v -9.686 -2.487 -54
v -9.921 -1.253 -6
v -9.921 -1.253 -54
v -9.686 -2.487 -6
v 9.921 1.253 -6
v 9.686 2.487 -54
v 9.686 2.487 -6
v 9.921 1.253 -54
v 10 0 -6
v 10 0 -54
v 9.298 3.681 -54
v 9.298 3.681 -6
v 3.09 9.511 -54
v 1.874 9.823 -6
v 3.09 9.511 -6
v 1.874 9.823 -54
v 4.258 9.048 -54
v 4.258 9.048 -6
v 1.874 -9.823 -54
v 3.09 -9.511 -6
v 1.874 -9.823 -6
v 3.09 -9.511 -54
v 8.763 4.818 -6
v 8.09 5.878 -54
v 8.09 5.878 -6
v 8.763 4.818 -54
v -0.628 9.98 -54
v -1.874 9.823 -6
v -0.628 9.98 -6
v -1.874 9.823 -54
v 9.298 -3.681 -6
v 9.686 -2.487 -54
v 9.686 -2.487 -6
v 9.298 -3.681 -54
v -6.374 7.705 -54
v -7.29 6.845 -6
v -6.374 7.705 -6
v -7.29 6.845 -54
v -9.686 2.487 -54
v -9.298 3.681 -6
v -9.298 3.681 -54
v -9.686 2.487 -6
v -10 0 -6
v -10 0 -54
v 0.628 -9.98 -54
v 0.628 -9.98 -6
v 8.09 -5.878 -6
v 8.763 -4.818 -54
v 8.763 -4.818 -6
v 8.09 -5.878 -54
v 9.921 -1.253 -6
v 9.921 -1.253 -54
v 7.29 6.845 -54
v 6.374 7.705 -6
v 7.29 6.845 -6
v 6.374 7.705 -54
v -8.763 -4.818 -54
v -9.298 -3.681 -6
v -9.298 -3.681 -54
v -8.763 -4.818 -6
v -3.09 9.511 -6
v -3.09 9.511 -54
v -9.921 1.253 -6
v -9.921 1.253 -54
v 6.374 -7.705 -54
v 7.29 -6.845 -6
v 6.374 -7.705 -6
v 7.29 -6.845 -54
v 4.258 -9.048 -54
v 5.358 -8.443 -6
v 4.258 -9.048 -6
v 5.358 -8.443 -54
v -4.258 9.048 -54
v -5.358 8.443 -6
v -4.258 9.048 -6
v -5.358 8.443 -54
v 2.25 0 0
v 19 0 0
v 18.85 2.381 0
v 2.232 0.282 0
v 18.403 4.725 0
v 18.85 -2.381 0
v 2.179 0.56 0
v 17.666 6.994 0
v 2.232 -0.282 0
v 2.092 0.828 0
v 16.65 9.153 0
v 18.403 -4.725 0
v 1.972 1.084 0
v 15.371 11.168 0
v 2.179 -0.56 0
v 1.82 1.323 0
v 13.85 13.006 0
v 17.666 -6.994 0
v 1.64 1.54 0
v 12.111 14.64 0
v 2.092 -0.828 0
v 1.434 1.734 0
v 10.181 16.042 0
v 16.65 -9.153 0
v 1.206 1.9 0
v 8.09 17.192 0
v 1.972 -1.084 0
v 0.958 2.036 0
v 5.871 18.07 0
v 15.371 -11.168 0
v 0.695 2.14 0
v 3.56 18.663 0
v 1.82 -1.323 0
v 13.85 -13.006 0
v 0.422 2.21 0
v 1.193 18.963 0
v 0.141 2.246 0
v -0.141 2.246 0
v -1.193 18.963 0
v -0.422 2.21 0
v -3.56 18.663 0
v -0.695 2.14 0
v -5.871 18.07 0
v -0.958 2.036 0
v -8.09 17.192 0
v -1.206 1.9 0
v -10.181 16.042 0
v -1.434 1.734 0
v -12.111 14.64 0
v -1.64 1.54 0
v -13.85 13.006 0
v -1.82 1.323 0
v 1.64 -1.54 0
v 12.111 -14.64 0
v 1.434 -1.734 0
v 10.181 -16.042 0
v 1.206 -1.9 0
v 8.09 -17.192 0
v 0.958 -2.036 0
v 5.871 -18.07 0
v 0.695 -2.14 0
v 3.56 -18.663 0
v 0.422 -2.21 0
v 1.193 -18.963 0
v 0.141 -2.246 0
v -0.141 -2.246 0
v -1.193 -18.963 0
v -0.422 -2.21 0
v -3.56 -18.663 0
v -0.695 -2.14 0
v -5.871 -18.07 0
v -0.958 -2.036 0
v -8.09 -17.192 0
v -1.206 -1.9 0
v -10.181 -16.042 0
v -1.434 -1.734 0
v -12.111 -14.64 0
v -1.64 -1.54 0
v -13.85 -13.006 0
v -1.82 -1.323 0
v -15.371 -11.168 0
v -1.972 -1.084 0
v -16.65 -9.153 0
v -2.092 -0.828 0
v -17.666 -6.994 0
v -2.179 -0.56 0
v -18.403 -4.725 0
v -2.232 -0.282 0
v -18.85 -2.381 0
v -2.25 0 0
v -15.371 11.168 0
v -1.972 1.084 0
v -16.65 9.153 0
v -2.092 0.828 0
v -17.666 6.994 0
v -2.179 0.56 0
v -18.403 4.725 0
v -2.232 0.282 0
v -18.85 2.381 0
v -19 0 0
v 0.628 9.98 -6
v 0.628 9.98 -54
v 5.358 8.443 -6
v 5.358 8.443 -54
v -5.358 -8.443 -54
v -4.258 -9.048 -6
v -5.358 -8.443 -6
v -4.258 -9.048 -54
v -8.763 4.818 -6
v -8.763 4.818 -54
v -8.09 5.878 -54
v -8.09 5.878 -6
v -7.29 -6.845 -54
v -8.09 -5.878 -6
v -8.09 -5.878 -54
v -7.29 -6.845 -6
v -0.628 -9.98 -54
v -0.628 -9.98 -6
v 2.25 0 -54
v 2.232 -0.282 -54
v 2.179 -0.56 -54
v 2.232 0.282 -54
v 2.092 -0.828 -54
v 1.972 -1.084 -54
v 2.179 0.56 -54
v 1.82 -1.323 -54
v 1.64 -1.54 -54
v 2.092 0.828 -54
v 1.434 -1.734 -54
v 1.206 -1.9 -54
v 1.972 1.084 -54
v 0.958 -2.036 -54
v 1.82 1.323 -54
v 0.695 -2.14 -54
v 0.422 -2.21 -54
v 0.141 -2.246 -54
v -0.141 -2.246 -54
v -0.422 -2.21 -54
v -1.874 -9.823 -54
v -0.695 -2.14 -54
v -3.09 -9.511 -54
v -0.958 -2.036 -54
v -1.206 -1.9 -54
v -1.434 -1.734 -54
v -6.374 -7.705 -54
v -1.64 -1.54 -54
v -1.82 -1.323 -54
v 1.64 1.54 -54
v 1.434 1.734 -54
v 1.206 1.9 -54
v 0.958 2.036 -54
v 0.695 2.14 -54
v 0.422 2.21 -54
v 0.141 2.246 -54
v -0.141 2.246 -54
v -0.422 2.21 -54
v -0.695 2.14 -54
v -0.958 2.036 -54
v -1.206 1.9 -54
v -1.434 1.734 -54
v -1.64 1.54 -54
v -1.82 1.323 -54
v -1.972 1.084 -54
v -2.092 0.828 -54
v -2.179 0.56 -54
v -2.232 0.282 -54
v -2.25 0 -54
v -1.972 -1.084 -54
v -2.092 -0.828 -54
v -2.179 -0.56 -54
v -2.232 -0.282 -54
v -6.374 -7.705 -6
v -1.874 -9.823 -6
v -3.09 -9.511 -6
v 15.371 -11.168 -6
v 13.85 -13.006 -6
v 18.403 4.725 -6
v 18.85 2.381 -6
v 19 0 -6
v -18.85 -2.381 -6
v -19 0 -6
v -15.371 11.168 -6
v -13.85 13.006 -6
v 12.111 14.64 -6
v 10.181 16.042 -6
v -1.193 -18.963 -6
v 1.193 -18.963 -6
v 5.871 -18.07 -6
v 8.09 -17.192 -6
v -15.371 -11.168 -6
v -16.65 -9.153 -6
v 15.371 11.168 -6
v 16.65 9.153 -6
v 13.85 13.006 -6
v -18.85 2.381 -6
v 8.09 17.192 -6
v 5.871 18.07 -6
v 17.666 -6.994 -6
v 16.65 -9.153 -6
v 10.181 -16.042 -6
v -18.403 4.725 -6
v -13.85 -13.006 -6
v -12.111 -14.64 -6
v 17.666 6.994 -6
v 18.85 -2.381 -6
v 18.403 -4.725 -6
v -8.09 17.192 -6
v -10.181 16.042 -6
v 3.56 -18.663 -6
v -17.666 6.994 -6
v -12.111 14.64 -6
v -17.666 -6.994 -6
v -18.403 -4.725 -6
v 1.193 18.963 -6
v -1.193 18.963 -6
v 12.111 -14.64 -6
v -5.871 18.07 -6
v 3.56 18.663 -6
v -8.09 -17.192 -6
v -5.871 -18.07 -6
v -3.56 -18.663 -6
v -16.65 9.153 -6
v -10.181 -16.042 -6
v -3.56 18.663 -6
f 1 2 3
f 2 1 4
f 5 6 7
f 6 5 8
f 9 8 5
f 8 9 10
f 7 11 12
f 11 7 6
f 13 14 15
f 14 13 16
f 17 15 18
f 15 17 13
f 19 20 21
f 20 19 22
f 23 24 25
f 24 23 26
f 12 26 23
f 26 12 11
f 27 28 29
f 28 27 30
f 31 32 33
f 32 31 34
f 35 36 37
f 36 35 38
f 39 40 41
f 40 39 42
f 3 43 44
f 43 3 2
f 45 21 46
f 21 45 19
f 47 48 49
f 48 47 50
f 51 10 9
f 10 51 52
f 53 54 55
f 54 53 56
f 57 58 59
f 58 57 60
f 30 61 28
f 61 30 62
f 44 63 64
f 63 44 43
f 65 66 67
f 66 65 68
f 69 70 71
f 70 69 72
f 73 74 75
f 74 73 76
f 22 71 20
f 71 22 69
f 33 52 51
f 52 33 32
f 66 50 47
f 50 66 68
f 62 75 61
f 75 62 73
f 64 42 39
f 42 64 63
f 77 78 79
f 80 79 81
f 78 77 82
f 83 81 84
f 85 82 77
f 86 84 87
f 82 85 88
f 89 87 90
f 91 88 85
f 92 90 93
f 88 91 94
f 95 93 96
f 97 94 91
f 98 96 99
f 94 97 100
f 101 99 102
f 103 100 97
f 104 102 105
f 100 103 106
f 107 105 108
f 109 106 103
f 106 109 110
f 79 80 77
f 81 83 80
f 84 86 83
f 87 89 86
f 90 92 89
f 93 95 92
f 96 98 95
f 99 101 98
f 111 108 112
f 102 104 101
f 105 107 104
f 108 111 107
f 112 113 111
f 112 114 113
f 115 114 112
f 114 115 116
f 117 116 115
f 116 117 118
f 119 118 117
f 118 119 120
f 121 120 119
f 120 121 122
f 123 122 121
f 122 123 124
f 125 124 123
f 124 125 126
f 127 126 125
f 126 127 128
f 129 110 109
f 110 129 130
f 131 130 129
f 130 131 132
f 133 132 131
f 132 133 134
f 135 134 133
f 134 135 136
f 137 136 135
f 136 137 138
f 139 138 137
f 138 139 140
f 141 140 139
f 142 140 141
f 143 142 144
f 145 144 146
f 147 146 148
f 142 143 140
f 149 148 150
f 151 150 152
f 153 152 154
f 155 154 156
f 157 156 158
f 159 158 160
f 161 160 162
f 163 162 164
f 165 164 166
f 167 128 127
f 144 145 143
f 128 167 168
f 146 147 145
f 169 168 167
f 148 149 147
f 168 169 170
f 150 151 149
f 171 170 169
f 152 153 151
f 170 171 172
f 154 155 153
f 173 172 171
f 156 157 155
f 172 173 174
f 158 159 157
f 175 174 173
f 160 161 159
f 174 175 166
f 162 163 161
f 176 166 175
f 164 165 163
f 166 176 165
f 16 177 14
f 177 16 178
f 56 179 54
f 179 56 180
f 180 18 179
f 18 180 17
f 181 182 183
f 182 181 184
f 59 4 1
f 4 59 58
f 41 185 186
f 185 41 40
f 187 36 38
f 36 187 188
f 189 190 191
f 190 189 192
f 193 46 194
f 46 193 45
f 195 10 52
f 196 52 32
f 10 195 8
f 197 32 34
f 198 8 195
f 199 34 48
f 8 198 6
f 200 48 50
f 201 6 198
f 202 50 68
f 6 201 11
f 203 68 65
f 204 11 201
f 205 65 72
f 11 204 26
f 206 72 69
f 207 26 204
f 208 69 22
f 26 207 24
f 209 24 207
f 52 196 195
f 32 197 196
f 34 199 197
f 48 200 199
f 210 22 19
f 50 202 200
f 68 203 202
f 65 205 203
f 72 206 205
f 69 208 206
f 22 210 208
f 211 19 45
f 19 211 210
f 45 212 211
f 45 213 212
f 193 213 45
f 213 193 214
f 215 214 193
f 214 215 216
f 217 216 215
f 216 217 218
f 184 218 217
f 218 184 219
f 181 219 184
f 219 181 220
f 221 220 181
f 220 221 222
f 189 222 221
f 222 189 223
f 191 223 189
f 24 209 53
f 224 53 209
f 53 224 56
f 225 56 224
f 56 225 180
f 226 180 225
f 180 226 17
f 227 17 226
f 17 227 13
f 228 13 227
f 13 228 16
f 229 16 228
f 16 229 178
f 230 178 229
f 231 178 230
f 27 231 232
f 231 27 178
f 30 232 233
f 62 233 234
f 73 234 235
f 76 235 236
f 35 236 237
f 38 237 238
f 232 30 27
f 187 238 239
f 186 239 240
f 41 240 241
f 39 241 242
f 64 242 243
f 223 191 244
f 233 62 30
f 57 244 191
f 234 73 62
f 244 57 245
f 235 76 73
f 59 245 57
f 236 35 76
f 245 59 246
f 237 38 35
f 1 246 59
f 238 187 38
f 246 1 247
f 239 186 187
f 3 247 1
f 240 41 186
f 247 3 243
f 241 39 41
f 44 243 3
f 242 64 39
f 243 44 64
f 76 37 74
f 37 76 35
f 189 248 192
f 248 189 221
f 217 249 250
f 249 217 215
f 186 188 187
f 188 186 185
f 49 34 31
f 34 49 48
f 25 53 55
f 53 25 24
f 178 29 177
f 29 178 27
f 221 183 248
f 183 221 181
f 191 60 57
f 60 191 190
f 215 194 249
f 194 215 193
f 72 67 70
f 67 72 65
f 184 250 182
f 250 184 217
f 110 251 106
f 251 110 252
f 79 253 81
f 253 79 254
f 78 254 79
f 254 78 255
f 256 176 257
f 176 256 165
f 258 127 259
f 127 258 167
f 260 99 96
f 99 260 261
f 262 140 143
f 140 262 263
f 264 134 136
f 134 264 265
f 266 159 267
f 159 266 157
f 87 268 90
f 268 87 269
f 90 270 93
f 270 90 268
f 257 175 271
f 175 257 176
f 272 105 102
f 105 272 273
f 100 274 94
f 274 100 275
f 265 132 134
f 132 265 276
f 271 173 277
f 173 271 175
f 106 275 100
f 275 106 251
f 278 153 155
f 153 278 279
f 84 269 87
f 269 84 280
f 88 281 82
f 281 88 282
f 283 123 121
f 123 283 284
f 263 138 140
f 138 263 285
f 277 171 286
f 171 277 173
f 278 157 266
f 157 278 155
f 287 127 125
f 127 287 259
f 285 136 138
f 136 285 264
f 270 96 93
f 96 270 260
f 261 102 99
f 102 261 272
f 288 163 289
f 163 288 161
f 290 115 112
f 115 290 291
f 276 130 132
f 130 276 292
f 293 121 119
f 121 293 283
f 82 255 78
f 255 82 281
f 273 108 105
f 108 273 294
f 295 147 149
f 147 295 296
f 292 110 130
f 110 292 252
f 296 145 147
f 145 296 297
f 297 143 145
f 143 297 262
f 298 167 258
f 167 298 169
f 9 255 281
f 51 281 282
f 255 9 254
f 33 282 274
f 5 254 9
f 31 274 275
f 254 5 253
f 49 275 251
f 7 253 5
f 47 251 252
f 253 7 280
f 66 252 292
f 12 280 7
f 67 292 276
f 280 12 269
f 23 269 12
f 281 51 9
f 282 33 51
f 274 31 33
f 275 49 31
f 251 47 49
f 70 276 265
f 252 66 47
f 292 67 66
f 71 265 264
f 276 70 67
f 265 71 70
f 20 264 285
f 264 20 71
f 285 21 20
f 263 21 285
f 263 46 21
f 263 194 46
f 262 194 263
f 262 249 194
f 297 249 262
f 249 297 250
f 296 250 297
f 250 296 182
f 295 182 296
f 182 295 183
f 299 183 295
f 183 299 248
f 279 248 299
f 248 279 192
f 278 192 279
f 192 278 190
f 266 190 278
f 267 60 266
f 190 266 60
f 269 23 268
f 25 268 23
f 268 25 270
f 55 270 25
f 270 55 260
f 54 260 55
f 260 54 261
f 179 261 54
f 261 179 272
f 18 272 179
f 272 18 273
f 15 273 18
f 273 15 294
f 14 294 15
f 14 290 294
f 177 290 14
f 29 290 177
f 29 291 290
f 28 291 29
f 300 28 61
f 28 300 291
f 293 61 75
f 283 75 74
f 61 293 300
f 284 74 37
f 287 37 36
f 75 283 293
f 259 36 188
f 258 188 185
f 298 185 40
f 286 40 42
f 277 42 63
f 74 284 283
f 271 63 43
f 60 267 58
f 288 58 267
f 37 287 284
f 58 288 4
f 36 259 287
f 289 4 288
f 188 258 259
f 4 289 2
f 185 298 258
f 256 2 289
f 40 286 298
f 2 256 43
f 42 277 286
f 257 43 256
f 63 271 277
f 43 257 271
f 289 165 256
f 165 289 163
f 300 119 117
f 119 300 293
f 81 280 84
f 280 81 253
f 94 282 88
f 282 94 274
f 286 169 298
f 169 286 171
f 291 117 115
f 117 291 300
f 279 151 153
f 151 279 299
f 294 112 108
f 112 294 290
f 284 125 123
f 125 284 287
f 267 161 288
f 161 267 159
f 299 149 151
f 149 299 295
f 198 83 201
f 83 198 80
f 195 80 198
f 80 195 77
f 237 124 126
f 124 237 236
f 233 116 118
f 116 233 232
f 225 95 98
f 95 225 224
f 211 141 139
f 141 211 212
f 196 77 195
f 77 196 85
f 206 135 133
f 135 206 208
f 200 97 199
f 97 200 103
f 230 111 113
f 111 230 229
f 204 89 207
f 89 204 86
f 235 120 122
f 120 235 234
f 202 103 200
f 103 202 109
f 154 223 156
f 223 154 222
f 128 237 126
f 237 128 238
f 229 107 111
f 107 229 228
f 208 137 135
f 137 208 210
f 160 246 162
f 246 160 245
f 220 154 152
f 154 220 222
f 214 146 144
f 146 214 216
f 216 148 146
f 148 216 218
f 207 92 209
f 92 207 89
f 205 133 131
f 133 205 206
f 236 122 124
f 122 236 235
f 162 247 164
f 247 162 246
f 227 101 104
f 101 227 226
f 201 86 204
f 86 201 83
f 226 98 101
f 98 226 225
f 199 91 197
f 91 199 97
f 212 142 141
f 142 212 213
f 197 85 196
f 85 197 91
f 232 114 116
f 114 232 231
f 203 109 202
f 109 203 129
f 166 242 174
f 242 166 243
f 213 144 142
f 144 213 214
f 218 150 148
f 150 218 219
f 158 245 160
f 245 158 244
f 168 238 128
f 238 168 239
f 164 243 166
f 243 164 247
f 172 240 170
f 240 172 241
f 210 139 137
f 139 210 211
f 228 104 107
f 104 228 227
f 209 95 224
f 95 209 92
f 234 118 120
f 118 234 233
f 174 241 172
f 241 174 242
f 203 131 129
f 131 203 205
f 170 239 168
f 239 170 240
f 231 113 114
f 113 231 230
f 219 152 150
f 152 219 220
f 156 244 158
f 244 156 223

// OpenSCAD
$fn = 50;


difference() {
	union() {
		translate(v = [0, 0, -54.0000000000]) {
			cylinder(h = 54, r = 10.0000000000);
		}
		translate(v = [0, 0, -6.0000000000]) {
			cylinder(h = 6, r = 19.0000000000);
		}
	}
	union() {
		#translate(v = [0, 0, -54]) {
			cylinder(h = 54, r = 2.2500000000);
		}
	}
}
